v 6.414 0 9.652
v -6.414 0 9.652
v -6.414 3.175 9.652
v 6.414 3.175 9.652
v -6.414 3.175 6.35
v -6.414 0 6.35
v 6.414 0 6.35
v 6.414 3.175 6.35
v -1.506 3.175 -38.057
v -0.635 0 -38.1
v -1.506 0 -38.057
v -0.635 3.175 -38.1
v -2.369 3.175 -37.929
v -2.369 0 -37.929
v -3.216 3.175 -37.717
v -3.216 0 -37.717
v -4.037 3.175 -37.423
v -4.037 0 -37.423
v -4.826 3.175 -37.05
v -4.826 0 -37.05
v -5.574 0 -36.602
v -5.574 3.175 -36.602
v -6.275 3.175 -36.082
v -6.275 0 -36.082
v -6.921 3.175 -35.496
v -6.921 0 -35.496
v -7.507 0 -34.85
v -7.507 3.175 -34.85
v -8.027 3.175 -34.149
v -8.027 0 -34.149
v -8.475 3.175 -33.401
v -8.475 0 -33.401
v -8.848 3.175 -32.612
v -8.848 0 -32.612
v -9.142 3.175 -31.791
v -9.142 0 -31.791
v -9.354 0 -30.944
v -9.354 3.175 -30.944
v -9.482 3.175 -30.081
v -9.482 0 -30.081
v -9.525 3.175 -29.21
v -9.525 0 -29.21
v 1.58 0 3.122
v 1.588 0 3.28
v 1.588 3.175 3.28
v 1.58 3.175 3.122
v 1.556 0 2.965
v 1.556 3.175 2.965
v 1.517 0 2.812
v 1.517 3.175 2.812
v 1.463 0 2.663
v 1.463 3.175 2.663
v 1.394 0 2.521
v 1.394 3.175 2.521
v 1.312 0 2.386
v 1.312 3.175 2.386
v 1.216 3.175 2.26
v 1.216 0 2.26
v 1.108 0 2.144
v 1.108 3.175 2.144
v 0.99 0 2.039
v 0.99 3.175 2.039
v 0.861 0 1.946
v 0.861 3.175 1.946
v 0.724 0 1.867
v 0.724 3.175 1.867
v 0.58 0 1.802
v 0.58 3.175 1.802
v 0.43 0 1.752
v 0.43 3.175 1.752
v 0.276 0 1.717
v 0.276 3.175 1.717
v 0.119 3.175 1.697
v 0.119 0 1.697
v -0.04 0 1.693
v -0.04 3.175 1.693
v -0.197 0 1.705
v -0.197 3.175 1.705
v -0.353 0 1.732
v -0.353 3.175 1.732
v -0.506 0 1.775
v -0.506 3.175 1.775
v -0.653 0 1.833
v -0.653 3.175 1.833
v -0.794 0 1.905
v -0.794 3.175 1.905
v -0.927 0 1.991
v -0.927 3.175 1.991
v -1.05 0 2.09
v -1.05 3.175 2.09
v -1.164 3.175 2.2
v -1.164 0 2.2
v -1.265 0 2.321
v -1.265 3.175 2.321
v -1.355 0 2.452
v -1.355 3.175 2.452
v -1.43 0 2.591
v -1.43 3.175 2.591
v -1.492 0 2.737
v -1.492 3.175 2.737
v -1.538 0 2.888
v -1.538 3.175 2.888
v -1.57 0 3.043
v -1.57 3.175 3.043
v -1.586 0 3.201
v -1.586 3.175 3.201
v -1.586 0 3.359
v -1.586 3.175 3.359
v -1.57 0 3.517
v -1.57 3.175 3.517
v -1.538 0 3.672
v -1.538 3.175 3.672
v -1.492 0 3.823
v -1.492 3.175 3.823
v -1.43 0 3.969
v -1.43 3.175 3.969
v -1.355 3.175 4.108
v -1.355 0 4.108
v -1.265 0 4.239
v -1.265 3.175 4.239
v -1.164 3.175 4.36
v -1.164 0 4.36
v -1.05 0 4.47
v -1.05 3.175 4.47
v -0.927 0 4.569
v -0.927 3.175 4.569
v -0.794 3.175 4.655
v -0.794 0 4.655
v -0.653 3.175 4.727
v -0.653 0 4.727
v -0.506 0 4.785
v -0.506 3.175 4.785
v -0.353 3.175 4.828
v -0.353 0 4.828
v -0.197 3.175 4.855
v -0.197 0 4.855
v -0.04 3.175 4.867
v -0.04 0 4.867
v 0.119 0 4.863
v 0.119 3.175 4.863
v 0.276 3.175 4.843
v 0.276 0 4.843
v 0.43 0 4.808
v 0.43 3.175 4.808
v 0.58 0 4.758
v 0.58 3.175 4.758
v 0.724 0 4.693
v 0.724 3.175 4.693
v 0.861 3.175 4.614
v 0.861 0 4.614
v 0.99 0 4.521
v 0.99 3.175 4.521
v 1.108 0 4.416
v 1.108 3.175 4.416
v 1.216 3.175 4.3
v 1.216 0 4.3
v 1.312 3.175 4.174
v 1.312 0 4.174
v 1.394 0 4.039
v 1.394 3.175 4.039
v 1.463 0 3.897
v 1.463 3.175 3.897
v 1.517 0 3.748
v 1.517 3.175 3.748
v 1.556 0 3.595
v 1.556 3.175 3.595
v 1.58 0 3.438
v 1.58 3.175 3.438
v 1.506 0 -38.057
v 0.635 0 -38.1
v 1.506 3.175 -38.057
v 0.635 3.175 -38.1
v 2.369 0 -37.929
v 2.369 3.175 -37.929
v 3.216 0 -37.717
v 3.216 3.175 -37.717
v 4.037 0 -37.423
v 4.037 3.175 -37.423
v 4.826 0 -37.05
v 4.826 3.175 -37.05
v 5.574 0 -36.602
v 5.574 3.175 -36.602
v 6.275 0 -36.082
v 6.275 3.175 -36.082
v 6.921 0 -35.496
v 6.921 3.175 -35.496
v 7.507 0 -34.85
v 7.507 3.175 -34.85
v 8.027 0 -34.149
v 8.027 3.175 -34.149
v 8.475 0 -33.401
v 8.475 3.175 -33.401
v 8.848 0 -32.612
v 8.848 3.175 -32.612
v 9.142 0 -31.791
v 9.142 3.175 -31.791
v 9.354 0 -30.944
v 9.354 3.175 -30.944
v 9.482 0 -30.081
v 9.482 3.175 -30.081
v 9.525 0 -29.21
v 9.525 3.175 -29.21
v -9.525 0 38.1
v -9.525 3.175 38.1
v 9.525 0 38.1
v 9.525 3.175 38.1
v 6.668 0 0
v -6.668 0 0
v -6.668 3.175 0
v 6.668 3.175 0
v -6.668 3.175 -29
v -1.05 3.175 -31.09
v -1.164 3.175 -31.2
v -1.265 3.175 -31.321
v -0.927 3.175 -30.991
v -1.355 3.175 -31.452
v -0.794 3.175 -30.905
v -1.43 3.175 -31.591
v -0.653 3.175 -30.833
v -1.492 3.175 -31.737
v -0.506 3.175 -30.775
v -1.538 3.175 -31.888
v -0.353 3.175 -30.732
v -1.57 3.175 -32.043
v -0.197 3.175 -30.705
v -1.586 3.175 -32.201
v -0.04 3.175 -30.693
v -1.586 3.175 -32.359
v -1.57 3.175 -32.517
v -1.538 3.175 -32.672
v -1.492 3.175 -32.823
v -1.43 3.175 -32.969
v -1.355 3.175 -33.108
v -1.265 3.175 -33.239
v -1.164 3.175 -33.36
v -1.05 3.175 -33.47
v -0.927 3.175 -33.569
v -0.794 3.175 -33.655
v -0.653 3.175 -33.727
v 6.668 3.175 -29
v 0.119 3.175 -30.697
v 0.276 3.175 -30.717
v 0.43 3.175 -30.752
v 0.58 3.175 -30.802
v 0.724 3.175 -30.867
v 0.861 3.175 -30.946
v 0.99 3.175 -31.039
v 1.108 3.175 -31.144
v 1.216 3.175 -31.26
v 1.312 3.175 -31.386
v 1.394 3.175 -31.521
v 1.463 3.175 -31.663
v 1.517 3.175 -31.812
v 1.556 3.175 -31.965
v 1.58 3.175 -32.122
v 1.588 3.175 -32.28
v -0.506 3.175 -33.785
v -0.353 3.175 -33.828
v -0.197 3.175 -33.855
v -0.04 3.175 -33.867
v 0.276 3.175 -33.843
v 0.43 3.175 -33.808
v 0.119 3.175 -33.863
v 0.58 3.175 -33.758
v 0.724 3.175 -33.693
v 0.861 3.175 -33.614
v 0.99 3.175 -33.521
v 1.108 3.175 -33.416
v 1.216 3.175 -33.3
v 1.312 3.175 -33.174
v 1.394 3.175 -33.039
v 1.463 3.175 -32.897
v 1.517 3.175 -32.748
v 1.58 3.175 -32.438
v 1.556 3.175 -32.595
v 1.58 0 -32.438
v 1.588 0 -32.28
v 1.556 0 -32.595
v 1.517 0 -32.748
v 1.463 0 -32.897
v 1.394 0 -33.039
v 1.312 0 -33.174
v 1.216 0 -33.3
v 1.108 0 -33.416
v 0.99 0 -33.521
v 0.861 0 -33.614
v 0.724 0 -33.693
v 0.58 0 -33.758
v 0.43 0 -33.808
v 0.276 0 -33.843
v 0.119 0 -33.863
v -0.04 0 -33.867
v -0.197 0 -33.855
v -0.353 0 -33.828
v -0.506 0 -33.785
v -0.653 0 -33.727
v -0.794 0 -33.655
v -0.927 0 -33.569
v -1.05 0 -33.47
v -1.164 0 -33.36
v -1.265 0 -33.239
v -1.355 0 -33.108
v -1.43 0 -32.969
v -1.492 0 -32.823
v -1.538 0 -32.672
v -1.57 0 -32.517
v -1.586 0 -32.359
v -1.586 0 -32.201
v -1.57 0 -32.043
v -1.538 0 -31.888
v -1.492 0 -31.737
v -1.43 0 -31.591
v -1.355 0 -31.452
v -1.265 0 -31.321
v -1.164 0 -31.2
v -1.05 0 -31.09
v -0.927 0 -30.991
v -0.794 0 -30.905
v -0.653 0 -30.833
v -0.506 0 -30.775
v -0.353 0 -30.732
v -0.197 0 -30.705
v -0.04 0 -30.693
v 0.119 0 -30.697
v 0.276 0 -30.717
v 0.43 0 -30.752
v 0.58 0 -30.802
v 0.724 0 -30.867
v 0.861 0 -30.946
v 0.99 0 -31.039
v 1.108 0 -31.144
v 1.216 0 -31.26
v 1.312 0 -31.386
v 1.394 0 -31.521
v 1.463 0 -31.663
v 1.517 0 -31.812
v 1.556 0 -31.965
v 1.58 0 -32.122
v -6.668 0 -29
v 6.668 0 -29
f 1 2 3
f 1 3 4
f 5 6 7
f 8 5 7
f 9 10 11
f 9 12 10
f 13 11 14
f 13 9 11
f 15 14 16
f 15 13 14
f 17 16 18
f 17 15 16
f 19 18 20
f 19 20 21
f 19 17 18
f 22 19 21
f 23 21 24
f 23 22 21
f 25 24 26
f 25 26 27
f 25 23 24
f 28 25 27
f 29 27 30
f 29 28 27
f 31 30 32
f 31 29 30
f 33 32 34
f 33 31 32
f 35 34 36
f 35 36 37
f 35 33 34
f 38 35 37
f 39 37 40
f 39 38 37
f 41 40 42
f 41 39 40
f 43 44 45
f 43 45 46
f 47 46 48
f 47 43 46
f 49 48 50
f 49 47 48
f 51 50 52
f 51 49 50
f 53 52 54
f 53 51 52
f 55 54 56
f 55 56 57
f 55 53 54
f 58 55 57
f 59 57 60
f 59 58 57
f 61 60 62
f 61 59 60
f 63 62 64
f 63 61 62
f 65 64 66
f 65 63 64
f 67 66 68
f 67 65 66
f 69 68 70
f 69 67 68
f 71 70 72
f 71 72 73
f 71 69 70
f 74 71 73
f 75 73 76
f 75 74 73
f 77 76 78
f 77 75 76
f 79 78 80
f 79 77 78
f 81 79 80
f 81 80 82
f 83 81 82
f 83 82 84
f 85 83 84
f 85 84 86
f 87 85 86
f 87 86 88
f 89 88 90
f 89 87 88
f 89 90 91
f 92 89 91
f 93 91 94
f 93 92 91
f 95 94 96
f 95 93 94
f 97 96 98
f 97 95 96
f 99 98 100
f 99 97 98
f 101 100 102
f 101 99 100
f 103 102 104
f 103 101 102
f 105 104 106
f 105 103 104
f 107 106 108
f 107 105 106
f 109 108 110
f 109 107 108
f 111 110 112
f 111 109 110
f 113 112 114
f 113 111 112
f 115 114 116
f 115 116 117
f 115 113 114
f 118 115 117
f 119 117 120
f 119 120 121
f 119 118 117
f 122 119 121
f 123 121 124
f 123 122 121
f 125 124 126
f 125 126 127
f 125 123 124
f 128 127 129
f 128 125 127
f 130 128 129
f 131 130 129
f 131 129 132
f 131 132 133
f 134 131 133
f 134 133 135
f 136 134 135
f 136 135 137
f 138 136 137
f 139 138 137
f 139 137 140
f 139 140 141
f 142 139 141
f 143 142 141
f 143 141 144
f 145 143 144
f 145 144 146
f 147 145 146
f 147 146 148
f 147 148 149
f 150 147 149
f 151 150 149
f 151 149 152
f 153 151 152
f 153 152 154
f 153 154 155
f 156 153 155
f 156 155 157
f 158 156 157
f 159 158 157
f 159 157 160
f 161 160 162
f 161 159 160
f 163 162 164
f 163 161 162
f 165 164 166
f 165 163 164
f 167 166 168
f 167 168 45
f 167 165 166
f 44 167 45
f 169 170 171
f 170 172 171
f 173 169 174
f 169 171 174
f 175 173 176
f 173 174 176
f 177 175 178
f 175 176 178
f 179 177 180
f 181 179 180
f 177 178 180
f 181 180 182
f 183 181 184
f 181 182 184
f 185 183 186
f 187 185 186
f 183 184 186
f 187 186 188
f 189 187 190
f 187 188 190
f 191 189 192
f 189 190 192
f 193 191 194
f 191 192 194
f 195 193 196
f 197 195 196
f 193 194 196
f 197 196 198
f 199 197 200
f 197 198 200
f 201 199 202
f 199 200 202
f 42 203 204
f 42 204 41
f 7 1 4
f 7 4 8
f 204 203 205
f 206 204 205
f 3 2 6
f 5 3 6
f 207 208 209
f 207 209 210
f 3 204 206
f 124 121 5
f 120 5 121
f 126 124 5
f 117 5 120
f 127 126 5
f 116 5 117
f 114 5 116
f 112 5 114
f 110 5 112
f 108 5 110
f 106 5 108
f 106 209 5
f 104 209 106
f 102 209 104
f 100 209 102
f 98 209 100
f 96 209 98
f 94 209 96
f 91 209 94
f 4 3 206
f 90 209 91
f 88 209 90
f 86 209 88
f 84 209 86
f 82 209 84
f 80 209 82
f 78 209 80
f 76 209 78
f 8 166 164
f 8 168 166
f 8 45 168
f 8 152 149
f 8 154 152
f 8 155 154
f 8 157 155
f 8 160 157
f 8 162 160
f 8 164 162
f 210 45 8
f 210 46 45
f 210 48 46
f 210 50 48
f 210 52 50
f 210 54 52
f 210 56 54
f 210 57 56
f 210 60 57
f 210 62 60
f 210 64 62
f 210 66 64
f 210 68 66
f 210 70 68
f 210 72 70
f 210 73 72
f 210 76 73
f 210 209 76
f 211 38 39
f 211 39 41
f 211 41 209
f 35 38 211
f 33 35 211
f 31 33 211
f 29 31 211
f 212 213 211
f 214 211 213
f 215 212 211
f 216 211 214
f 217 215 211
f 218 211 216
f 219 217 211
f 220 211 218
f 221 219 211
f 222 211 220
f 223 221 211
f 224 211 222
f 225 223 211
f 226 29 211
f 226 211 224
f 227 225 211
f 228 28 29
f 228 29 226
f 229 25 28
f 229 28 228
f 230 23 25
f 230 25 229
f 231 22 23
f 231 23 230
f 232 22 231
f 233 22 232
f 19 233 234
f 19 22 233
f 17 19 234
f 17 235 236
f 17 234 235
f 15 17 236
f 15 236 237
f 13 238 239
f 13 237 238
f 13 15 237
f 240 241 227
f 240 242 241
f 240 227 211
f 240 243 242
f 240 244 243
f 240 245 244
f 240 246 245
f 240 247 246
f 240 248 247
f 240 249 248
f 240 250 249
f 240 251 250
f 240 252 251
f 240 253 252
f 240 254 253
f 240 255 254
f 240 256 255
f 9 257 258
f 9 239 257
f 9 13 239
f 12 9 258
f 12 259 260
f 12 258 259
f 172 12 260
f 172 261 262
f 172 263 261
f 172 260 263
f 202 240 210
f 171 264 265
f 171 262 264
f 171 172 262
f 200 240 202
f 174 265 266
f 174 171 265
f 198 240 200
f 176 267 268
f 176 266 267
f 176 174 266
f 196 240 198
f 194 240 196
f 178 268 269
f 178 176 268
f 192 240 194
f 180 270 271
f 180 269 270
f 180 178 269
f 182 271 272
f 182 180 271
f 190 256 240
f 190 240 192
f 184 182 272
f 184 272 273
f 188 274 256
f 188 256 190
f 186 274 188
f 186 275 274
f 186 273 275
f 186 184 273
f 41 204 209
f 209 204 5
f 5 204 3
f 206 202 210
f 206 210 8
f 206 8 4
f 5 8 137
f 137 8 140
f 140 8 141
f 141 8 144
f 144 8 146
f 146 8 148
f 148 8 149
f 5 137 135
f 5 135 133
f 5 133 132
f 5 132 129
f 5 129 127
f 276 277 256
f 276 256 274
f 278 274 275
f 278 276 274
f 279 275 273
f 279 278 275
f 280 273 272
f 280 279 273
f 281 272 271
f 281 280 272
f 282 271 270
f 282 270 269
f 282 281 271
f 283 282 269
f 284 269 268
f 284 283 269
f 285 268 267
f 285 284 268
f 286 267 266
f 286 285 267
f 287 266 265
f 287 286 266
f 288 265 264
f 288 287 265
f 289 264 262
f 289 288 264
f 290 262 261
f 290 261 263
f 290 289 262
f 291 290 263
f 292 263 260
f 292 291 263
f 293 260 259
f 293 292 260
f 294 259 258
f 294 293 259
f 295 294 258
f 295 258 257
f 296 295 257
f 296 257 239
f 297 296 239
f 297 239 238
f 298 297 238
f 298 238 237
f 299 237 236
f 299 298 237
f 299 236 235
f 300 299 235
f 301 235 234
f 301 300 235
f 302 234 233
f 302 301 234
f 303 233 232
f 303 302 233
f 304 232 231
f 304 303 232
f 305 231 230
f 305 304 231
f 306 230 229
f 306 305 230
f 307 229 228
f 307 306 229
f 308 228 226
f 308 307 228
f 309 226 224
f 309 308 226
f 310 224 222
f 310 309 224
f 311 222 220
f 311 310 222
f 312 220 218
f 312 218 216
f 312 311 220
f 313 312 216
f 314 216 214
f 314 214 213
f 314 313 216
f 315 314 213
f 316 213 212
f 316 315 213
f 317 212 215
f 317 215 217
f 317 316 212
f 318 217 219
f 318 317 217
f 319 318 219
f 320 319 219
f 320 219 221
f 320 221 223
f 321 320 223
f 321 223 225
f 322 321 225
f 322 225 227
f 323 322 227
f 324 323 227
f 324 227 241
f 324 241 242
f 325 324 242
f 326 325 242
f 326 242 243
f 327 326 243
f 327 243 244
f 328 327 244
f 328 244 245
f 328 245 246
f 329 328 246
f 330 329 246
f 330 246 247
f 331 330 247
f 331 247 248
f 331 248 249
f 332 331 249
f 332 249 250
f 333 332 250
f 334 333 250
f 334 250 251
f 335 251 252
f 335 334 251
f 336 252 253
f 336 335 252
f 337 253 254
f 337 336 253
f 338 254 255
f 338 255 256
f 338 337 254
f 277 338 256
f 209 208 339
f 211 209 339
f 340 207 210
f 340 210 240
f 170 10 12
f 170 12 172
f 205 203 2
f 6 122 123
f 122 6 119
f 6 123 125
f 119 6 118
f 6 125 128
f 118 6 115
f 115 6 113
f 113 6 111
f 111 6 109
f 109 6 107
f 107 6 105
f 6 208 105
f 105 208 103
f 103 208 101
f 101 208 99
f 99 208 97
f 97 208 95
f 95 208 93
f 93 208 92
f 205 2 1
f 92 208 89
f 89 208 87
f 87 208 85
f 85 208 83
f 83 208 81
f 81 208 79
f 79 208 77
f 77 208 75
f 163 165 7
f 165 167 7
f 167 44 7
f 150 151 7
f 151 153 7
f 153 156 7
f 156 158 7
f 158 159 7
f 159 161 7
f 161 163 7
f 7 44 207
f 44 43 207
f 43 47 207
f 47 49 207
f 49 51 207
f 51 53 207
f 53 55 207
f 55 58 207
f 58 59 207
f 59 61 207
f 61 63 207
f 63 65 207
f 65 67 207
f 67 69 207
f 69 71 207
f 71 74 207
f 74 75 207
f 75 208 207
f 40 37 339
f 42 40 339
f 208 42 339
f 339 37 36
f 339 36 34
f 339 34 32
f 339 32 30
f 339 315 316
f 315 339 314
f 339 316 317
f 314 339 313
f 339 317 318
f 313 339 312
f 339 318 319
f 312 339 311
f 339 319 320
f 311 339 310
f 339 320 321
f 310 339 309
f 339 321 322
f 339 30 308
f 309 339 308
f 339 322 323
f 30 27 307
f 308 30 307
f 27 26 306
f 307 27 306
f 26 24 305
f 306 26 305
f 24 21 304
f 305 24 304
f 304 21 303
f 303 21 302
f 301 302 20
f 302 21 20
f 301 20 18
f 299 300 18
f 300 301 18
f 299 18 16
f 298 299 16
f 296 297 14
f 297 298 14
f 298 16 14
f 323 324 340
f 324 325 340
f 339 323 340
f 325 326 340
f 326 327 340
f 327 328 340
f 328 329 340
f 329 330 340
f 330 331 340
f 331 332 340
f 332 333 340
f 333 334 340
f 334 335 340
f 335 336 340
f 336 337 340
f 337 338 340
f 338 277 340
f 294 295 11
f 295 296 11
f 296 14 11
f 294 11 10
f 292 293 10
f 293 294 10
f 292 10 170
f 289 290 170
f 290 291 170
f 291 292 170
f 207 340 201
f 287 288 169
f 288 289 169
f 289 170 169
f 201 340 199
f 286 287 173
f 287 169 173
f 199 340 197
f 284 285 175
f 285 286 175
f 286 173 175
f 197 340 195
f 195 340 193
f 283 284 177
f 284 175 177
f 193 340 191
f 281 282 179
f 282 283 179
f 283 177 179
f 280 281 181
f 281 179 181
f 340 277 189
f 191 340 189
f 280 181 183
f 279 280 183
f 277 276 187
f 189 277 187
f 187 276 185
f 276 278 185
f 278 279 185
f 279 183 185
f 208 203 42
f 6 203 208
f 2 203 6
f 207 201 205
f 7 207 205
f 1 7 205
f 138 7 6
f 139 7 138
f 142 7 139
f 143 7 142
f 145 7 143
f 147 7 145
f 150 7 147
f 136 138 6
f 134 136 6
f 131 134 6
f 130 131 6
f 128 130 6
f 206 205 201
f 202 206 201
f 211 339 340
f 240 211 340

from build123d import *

# Parameters (mm, degrees)
SKETCH1_W           = 19.05
SKETCH1_H           = 76.2
SKETCH1_R           = 1.5875
SKETCH1_W_2         = 13.335
SKETCH1_H_2         = 29
SKETCH1_W_3         = 12.827
SKETCH1_H_3         = 3.302
BOSS_EXTRUDE1_DEPTH = 3.175
FILLET1_R           = 8.89
FILLET2_R           = 8.89


with BuildPart() as part:
    # Sketch1 → Boss-Extrude1 (new body)
    with BuildSketch(Plane(origin=(0, 0, 0), x_dir=(1, 0, 0), z_dir=(0, 1, 0))):
        Rectangle(SKETCH1_W, SKETCH1_H)
        with Locations((0, 32.28)):
            Circle(SKETCH1_R, mode=Mode.SUBTRACT)
        with Locations((0, -3.28)):
            Circle(SKETCH1_R, mode=Mode.SUBTRACT)
        with Locations((0, 14.5)):
            Rectangle(SKETCH1_W_2, SKETCH1_H_2, mode=Mode.SUBTRACT)
        with Locations((0, -8.001)):
            Rectangle(SKETCH1_W_3, SKETCH1_H_3, mode=Mode.SUBTRACT)
    extrude(amount=BOSS_EXTRUDE1_DEPTH)

    # Fillet1
    fillet1_edges = [part.edges().sort_by_distance(p)[0] for p in [
        (9.525, 1.5875, -38.1),
    ]]
    fillet(fillet1_edges, radius=FILLET1_R)

    # Fillet2
    fillet2_edges = [part.edges().sort_by_distance(p)[0] for p in [
        (-9.525, 1.5875, -38.1),
    ]]
    fillet(fillet2_edges, radius=FILLET2_R)


solid = part.part
